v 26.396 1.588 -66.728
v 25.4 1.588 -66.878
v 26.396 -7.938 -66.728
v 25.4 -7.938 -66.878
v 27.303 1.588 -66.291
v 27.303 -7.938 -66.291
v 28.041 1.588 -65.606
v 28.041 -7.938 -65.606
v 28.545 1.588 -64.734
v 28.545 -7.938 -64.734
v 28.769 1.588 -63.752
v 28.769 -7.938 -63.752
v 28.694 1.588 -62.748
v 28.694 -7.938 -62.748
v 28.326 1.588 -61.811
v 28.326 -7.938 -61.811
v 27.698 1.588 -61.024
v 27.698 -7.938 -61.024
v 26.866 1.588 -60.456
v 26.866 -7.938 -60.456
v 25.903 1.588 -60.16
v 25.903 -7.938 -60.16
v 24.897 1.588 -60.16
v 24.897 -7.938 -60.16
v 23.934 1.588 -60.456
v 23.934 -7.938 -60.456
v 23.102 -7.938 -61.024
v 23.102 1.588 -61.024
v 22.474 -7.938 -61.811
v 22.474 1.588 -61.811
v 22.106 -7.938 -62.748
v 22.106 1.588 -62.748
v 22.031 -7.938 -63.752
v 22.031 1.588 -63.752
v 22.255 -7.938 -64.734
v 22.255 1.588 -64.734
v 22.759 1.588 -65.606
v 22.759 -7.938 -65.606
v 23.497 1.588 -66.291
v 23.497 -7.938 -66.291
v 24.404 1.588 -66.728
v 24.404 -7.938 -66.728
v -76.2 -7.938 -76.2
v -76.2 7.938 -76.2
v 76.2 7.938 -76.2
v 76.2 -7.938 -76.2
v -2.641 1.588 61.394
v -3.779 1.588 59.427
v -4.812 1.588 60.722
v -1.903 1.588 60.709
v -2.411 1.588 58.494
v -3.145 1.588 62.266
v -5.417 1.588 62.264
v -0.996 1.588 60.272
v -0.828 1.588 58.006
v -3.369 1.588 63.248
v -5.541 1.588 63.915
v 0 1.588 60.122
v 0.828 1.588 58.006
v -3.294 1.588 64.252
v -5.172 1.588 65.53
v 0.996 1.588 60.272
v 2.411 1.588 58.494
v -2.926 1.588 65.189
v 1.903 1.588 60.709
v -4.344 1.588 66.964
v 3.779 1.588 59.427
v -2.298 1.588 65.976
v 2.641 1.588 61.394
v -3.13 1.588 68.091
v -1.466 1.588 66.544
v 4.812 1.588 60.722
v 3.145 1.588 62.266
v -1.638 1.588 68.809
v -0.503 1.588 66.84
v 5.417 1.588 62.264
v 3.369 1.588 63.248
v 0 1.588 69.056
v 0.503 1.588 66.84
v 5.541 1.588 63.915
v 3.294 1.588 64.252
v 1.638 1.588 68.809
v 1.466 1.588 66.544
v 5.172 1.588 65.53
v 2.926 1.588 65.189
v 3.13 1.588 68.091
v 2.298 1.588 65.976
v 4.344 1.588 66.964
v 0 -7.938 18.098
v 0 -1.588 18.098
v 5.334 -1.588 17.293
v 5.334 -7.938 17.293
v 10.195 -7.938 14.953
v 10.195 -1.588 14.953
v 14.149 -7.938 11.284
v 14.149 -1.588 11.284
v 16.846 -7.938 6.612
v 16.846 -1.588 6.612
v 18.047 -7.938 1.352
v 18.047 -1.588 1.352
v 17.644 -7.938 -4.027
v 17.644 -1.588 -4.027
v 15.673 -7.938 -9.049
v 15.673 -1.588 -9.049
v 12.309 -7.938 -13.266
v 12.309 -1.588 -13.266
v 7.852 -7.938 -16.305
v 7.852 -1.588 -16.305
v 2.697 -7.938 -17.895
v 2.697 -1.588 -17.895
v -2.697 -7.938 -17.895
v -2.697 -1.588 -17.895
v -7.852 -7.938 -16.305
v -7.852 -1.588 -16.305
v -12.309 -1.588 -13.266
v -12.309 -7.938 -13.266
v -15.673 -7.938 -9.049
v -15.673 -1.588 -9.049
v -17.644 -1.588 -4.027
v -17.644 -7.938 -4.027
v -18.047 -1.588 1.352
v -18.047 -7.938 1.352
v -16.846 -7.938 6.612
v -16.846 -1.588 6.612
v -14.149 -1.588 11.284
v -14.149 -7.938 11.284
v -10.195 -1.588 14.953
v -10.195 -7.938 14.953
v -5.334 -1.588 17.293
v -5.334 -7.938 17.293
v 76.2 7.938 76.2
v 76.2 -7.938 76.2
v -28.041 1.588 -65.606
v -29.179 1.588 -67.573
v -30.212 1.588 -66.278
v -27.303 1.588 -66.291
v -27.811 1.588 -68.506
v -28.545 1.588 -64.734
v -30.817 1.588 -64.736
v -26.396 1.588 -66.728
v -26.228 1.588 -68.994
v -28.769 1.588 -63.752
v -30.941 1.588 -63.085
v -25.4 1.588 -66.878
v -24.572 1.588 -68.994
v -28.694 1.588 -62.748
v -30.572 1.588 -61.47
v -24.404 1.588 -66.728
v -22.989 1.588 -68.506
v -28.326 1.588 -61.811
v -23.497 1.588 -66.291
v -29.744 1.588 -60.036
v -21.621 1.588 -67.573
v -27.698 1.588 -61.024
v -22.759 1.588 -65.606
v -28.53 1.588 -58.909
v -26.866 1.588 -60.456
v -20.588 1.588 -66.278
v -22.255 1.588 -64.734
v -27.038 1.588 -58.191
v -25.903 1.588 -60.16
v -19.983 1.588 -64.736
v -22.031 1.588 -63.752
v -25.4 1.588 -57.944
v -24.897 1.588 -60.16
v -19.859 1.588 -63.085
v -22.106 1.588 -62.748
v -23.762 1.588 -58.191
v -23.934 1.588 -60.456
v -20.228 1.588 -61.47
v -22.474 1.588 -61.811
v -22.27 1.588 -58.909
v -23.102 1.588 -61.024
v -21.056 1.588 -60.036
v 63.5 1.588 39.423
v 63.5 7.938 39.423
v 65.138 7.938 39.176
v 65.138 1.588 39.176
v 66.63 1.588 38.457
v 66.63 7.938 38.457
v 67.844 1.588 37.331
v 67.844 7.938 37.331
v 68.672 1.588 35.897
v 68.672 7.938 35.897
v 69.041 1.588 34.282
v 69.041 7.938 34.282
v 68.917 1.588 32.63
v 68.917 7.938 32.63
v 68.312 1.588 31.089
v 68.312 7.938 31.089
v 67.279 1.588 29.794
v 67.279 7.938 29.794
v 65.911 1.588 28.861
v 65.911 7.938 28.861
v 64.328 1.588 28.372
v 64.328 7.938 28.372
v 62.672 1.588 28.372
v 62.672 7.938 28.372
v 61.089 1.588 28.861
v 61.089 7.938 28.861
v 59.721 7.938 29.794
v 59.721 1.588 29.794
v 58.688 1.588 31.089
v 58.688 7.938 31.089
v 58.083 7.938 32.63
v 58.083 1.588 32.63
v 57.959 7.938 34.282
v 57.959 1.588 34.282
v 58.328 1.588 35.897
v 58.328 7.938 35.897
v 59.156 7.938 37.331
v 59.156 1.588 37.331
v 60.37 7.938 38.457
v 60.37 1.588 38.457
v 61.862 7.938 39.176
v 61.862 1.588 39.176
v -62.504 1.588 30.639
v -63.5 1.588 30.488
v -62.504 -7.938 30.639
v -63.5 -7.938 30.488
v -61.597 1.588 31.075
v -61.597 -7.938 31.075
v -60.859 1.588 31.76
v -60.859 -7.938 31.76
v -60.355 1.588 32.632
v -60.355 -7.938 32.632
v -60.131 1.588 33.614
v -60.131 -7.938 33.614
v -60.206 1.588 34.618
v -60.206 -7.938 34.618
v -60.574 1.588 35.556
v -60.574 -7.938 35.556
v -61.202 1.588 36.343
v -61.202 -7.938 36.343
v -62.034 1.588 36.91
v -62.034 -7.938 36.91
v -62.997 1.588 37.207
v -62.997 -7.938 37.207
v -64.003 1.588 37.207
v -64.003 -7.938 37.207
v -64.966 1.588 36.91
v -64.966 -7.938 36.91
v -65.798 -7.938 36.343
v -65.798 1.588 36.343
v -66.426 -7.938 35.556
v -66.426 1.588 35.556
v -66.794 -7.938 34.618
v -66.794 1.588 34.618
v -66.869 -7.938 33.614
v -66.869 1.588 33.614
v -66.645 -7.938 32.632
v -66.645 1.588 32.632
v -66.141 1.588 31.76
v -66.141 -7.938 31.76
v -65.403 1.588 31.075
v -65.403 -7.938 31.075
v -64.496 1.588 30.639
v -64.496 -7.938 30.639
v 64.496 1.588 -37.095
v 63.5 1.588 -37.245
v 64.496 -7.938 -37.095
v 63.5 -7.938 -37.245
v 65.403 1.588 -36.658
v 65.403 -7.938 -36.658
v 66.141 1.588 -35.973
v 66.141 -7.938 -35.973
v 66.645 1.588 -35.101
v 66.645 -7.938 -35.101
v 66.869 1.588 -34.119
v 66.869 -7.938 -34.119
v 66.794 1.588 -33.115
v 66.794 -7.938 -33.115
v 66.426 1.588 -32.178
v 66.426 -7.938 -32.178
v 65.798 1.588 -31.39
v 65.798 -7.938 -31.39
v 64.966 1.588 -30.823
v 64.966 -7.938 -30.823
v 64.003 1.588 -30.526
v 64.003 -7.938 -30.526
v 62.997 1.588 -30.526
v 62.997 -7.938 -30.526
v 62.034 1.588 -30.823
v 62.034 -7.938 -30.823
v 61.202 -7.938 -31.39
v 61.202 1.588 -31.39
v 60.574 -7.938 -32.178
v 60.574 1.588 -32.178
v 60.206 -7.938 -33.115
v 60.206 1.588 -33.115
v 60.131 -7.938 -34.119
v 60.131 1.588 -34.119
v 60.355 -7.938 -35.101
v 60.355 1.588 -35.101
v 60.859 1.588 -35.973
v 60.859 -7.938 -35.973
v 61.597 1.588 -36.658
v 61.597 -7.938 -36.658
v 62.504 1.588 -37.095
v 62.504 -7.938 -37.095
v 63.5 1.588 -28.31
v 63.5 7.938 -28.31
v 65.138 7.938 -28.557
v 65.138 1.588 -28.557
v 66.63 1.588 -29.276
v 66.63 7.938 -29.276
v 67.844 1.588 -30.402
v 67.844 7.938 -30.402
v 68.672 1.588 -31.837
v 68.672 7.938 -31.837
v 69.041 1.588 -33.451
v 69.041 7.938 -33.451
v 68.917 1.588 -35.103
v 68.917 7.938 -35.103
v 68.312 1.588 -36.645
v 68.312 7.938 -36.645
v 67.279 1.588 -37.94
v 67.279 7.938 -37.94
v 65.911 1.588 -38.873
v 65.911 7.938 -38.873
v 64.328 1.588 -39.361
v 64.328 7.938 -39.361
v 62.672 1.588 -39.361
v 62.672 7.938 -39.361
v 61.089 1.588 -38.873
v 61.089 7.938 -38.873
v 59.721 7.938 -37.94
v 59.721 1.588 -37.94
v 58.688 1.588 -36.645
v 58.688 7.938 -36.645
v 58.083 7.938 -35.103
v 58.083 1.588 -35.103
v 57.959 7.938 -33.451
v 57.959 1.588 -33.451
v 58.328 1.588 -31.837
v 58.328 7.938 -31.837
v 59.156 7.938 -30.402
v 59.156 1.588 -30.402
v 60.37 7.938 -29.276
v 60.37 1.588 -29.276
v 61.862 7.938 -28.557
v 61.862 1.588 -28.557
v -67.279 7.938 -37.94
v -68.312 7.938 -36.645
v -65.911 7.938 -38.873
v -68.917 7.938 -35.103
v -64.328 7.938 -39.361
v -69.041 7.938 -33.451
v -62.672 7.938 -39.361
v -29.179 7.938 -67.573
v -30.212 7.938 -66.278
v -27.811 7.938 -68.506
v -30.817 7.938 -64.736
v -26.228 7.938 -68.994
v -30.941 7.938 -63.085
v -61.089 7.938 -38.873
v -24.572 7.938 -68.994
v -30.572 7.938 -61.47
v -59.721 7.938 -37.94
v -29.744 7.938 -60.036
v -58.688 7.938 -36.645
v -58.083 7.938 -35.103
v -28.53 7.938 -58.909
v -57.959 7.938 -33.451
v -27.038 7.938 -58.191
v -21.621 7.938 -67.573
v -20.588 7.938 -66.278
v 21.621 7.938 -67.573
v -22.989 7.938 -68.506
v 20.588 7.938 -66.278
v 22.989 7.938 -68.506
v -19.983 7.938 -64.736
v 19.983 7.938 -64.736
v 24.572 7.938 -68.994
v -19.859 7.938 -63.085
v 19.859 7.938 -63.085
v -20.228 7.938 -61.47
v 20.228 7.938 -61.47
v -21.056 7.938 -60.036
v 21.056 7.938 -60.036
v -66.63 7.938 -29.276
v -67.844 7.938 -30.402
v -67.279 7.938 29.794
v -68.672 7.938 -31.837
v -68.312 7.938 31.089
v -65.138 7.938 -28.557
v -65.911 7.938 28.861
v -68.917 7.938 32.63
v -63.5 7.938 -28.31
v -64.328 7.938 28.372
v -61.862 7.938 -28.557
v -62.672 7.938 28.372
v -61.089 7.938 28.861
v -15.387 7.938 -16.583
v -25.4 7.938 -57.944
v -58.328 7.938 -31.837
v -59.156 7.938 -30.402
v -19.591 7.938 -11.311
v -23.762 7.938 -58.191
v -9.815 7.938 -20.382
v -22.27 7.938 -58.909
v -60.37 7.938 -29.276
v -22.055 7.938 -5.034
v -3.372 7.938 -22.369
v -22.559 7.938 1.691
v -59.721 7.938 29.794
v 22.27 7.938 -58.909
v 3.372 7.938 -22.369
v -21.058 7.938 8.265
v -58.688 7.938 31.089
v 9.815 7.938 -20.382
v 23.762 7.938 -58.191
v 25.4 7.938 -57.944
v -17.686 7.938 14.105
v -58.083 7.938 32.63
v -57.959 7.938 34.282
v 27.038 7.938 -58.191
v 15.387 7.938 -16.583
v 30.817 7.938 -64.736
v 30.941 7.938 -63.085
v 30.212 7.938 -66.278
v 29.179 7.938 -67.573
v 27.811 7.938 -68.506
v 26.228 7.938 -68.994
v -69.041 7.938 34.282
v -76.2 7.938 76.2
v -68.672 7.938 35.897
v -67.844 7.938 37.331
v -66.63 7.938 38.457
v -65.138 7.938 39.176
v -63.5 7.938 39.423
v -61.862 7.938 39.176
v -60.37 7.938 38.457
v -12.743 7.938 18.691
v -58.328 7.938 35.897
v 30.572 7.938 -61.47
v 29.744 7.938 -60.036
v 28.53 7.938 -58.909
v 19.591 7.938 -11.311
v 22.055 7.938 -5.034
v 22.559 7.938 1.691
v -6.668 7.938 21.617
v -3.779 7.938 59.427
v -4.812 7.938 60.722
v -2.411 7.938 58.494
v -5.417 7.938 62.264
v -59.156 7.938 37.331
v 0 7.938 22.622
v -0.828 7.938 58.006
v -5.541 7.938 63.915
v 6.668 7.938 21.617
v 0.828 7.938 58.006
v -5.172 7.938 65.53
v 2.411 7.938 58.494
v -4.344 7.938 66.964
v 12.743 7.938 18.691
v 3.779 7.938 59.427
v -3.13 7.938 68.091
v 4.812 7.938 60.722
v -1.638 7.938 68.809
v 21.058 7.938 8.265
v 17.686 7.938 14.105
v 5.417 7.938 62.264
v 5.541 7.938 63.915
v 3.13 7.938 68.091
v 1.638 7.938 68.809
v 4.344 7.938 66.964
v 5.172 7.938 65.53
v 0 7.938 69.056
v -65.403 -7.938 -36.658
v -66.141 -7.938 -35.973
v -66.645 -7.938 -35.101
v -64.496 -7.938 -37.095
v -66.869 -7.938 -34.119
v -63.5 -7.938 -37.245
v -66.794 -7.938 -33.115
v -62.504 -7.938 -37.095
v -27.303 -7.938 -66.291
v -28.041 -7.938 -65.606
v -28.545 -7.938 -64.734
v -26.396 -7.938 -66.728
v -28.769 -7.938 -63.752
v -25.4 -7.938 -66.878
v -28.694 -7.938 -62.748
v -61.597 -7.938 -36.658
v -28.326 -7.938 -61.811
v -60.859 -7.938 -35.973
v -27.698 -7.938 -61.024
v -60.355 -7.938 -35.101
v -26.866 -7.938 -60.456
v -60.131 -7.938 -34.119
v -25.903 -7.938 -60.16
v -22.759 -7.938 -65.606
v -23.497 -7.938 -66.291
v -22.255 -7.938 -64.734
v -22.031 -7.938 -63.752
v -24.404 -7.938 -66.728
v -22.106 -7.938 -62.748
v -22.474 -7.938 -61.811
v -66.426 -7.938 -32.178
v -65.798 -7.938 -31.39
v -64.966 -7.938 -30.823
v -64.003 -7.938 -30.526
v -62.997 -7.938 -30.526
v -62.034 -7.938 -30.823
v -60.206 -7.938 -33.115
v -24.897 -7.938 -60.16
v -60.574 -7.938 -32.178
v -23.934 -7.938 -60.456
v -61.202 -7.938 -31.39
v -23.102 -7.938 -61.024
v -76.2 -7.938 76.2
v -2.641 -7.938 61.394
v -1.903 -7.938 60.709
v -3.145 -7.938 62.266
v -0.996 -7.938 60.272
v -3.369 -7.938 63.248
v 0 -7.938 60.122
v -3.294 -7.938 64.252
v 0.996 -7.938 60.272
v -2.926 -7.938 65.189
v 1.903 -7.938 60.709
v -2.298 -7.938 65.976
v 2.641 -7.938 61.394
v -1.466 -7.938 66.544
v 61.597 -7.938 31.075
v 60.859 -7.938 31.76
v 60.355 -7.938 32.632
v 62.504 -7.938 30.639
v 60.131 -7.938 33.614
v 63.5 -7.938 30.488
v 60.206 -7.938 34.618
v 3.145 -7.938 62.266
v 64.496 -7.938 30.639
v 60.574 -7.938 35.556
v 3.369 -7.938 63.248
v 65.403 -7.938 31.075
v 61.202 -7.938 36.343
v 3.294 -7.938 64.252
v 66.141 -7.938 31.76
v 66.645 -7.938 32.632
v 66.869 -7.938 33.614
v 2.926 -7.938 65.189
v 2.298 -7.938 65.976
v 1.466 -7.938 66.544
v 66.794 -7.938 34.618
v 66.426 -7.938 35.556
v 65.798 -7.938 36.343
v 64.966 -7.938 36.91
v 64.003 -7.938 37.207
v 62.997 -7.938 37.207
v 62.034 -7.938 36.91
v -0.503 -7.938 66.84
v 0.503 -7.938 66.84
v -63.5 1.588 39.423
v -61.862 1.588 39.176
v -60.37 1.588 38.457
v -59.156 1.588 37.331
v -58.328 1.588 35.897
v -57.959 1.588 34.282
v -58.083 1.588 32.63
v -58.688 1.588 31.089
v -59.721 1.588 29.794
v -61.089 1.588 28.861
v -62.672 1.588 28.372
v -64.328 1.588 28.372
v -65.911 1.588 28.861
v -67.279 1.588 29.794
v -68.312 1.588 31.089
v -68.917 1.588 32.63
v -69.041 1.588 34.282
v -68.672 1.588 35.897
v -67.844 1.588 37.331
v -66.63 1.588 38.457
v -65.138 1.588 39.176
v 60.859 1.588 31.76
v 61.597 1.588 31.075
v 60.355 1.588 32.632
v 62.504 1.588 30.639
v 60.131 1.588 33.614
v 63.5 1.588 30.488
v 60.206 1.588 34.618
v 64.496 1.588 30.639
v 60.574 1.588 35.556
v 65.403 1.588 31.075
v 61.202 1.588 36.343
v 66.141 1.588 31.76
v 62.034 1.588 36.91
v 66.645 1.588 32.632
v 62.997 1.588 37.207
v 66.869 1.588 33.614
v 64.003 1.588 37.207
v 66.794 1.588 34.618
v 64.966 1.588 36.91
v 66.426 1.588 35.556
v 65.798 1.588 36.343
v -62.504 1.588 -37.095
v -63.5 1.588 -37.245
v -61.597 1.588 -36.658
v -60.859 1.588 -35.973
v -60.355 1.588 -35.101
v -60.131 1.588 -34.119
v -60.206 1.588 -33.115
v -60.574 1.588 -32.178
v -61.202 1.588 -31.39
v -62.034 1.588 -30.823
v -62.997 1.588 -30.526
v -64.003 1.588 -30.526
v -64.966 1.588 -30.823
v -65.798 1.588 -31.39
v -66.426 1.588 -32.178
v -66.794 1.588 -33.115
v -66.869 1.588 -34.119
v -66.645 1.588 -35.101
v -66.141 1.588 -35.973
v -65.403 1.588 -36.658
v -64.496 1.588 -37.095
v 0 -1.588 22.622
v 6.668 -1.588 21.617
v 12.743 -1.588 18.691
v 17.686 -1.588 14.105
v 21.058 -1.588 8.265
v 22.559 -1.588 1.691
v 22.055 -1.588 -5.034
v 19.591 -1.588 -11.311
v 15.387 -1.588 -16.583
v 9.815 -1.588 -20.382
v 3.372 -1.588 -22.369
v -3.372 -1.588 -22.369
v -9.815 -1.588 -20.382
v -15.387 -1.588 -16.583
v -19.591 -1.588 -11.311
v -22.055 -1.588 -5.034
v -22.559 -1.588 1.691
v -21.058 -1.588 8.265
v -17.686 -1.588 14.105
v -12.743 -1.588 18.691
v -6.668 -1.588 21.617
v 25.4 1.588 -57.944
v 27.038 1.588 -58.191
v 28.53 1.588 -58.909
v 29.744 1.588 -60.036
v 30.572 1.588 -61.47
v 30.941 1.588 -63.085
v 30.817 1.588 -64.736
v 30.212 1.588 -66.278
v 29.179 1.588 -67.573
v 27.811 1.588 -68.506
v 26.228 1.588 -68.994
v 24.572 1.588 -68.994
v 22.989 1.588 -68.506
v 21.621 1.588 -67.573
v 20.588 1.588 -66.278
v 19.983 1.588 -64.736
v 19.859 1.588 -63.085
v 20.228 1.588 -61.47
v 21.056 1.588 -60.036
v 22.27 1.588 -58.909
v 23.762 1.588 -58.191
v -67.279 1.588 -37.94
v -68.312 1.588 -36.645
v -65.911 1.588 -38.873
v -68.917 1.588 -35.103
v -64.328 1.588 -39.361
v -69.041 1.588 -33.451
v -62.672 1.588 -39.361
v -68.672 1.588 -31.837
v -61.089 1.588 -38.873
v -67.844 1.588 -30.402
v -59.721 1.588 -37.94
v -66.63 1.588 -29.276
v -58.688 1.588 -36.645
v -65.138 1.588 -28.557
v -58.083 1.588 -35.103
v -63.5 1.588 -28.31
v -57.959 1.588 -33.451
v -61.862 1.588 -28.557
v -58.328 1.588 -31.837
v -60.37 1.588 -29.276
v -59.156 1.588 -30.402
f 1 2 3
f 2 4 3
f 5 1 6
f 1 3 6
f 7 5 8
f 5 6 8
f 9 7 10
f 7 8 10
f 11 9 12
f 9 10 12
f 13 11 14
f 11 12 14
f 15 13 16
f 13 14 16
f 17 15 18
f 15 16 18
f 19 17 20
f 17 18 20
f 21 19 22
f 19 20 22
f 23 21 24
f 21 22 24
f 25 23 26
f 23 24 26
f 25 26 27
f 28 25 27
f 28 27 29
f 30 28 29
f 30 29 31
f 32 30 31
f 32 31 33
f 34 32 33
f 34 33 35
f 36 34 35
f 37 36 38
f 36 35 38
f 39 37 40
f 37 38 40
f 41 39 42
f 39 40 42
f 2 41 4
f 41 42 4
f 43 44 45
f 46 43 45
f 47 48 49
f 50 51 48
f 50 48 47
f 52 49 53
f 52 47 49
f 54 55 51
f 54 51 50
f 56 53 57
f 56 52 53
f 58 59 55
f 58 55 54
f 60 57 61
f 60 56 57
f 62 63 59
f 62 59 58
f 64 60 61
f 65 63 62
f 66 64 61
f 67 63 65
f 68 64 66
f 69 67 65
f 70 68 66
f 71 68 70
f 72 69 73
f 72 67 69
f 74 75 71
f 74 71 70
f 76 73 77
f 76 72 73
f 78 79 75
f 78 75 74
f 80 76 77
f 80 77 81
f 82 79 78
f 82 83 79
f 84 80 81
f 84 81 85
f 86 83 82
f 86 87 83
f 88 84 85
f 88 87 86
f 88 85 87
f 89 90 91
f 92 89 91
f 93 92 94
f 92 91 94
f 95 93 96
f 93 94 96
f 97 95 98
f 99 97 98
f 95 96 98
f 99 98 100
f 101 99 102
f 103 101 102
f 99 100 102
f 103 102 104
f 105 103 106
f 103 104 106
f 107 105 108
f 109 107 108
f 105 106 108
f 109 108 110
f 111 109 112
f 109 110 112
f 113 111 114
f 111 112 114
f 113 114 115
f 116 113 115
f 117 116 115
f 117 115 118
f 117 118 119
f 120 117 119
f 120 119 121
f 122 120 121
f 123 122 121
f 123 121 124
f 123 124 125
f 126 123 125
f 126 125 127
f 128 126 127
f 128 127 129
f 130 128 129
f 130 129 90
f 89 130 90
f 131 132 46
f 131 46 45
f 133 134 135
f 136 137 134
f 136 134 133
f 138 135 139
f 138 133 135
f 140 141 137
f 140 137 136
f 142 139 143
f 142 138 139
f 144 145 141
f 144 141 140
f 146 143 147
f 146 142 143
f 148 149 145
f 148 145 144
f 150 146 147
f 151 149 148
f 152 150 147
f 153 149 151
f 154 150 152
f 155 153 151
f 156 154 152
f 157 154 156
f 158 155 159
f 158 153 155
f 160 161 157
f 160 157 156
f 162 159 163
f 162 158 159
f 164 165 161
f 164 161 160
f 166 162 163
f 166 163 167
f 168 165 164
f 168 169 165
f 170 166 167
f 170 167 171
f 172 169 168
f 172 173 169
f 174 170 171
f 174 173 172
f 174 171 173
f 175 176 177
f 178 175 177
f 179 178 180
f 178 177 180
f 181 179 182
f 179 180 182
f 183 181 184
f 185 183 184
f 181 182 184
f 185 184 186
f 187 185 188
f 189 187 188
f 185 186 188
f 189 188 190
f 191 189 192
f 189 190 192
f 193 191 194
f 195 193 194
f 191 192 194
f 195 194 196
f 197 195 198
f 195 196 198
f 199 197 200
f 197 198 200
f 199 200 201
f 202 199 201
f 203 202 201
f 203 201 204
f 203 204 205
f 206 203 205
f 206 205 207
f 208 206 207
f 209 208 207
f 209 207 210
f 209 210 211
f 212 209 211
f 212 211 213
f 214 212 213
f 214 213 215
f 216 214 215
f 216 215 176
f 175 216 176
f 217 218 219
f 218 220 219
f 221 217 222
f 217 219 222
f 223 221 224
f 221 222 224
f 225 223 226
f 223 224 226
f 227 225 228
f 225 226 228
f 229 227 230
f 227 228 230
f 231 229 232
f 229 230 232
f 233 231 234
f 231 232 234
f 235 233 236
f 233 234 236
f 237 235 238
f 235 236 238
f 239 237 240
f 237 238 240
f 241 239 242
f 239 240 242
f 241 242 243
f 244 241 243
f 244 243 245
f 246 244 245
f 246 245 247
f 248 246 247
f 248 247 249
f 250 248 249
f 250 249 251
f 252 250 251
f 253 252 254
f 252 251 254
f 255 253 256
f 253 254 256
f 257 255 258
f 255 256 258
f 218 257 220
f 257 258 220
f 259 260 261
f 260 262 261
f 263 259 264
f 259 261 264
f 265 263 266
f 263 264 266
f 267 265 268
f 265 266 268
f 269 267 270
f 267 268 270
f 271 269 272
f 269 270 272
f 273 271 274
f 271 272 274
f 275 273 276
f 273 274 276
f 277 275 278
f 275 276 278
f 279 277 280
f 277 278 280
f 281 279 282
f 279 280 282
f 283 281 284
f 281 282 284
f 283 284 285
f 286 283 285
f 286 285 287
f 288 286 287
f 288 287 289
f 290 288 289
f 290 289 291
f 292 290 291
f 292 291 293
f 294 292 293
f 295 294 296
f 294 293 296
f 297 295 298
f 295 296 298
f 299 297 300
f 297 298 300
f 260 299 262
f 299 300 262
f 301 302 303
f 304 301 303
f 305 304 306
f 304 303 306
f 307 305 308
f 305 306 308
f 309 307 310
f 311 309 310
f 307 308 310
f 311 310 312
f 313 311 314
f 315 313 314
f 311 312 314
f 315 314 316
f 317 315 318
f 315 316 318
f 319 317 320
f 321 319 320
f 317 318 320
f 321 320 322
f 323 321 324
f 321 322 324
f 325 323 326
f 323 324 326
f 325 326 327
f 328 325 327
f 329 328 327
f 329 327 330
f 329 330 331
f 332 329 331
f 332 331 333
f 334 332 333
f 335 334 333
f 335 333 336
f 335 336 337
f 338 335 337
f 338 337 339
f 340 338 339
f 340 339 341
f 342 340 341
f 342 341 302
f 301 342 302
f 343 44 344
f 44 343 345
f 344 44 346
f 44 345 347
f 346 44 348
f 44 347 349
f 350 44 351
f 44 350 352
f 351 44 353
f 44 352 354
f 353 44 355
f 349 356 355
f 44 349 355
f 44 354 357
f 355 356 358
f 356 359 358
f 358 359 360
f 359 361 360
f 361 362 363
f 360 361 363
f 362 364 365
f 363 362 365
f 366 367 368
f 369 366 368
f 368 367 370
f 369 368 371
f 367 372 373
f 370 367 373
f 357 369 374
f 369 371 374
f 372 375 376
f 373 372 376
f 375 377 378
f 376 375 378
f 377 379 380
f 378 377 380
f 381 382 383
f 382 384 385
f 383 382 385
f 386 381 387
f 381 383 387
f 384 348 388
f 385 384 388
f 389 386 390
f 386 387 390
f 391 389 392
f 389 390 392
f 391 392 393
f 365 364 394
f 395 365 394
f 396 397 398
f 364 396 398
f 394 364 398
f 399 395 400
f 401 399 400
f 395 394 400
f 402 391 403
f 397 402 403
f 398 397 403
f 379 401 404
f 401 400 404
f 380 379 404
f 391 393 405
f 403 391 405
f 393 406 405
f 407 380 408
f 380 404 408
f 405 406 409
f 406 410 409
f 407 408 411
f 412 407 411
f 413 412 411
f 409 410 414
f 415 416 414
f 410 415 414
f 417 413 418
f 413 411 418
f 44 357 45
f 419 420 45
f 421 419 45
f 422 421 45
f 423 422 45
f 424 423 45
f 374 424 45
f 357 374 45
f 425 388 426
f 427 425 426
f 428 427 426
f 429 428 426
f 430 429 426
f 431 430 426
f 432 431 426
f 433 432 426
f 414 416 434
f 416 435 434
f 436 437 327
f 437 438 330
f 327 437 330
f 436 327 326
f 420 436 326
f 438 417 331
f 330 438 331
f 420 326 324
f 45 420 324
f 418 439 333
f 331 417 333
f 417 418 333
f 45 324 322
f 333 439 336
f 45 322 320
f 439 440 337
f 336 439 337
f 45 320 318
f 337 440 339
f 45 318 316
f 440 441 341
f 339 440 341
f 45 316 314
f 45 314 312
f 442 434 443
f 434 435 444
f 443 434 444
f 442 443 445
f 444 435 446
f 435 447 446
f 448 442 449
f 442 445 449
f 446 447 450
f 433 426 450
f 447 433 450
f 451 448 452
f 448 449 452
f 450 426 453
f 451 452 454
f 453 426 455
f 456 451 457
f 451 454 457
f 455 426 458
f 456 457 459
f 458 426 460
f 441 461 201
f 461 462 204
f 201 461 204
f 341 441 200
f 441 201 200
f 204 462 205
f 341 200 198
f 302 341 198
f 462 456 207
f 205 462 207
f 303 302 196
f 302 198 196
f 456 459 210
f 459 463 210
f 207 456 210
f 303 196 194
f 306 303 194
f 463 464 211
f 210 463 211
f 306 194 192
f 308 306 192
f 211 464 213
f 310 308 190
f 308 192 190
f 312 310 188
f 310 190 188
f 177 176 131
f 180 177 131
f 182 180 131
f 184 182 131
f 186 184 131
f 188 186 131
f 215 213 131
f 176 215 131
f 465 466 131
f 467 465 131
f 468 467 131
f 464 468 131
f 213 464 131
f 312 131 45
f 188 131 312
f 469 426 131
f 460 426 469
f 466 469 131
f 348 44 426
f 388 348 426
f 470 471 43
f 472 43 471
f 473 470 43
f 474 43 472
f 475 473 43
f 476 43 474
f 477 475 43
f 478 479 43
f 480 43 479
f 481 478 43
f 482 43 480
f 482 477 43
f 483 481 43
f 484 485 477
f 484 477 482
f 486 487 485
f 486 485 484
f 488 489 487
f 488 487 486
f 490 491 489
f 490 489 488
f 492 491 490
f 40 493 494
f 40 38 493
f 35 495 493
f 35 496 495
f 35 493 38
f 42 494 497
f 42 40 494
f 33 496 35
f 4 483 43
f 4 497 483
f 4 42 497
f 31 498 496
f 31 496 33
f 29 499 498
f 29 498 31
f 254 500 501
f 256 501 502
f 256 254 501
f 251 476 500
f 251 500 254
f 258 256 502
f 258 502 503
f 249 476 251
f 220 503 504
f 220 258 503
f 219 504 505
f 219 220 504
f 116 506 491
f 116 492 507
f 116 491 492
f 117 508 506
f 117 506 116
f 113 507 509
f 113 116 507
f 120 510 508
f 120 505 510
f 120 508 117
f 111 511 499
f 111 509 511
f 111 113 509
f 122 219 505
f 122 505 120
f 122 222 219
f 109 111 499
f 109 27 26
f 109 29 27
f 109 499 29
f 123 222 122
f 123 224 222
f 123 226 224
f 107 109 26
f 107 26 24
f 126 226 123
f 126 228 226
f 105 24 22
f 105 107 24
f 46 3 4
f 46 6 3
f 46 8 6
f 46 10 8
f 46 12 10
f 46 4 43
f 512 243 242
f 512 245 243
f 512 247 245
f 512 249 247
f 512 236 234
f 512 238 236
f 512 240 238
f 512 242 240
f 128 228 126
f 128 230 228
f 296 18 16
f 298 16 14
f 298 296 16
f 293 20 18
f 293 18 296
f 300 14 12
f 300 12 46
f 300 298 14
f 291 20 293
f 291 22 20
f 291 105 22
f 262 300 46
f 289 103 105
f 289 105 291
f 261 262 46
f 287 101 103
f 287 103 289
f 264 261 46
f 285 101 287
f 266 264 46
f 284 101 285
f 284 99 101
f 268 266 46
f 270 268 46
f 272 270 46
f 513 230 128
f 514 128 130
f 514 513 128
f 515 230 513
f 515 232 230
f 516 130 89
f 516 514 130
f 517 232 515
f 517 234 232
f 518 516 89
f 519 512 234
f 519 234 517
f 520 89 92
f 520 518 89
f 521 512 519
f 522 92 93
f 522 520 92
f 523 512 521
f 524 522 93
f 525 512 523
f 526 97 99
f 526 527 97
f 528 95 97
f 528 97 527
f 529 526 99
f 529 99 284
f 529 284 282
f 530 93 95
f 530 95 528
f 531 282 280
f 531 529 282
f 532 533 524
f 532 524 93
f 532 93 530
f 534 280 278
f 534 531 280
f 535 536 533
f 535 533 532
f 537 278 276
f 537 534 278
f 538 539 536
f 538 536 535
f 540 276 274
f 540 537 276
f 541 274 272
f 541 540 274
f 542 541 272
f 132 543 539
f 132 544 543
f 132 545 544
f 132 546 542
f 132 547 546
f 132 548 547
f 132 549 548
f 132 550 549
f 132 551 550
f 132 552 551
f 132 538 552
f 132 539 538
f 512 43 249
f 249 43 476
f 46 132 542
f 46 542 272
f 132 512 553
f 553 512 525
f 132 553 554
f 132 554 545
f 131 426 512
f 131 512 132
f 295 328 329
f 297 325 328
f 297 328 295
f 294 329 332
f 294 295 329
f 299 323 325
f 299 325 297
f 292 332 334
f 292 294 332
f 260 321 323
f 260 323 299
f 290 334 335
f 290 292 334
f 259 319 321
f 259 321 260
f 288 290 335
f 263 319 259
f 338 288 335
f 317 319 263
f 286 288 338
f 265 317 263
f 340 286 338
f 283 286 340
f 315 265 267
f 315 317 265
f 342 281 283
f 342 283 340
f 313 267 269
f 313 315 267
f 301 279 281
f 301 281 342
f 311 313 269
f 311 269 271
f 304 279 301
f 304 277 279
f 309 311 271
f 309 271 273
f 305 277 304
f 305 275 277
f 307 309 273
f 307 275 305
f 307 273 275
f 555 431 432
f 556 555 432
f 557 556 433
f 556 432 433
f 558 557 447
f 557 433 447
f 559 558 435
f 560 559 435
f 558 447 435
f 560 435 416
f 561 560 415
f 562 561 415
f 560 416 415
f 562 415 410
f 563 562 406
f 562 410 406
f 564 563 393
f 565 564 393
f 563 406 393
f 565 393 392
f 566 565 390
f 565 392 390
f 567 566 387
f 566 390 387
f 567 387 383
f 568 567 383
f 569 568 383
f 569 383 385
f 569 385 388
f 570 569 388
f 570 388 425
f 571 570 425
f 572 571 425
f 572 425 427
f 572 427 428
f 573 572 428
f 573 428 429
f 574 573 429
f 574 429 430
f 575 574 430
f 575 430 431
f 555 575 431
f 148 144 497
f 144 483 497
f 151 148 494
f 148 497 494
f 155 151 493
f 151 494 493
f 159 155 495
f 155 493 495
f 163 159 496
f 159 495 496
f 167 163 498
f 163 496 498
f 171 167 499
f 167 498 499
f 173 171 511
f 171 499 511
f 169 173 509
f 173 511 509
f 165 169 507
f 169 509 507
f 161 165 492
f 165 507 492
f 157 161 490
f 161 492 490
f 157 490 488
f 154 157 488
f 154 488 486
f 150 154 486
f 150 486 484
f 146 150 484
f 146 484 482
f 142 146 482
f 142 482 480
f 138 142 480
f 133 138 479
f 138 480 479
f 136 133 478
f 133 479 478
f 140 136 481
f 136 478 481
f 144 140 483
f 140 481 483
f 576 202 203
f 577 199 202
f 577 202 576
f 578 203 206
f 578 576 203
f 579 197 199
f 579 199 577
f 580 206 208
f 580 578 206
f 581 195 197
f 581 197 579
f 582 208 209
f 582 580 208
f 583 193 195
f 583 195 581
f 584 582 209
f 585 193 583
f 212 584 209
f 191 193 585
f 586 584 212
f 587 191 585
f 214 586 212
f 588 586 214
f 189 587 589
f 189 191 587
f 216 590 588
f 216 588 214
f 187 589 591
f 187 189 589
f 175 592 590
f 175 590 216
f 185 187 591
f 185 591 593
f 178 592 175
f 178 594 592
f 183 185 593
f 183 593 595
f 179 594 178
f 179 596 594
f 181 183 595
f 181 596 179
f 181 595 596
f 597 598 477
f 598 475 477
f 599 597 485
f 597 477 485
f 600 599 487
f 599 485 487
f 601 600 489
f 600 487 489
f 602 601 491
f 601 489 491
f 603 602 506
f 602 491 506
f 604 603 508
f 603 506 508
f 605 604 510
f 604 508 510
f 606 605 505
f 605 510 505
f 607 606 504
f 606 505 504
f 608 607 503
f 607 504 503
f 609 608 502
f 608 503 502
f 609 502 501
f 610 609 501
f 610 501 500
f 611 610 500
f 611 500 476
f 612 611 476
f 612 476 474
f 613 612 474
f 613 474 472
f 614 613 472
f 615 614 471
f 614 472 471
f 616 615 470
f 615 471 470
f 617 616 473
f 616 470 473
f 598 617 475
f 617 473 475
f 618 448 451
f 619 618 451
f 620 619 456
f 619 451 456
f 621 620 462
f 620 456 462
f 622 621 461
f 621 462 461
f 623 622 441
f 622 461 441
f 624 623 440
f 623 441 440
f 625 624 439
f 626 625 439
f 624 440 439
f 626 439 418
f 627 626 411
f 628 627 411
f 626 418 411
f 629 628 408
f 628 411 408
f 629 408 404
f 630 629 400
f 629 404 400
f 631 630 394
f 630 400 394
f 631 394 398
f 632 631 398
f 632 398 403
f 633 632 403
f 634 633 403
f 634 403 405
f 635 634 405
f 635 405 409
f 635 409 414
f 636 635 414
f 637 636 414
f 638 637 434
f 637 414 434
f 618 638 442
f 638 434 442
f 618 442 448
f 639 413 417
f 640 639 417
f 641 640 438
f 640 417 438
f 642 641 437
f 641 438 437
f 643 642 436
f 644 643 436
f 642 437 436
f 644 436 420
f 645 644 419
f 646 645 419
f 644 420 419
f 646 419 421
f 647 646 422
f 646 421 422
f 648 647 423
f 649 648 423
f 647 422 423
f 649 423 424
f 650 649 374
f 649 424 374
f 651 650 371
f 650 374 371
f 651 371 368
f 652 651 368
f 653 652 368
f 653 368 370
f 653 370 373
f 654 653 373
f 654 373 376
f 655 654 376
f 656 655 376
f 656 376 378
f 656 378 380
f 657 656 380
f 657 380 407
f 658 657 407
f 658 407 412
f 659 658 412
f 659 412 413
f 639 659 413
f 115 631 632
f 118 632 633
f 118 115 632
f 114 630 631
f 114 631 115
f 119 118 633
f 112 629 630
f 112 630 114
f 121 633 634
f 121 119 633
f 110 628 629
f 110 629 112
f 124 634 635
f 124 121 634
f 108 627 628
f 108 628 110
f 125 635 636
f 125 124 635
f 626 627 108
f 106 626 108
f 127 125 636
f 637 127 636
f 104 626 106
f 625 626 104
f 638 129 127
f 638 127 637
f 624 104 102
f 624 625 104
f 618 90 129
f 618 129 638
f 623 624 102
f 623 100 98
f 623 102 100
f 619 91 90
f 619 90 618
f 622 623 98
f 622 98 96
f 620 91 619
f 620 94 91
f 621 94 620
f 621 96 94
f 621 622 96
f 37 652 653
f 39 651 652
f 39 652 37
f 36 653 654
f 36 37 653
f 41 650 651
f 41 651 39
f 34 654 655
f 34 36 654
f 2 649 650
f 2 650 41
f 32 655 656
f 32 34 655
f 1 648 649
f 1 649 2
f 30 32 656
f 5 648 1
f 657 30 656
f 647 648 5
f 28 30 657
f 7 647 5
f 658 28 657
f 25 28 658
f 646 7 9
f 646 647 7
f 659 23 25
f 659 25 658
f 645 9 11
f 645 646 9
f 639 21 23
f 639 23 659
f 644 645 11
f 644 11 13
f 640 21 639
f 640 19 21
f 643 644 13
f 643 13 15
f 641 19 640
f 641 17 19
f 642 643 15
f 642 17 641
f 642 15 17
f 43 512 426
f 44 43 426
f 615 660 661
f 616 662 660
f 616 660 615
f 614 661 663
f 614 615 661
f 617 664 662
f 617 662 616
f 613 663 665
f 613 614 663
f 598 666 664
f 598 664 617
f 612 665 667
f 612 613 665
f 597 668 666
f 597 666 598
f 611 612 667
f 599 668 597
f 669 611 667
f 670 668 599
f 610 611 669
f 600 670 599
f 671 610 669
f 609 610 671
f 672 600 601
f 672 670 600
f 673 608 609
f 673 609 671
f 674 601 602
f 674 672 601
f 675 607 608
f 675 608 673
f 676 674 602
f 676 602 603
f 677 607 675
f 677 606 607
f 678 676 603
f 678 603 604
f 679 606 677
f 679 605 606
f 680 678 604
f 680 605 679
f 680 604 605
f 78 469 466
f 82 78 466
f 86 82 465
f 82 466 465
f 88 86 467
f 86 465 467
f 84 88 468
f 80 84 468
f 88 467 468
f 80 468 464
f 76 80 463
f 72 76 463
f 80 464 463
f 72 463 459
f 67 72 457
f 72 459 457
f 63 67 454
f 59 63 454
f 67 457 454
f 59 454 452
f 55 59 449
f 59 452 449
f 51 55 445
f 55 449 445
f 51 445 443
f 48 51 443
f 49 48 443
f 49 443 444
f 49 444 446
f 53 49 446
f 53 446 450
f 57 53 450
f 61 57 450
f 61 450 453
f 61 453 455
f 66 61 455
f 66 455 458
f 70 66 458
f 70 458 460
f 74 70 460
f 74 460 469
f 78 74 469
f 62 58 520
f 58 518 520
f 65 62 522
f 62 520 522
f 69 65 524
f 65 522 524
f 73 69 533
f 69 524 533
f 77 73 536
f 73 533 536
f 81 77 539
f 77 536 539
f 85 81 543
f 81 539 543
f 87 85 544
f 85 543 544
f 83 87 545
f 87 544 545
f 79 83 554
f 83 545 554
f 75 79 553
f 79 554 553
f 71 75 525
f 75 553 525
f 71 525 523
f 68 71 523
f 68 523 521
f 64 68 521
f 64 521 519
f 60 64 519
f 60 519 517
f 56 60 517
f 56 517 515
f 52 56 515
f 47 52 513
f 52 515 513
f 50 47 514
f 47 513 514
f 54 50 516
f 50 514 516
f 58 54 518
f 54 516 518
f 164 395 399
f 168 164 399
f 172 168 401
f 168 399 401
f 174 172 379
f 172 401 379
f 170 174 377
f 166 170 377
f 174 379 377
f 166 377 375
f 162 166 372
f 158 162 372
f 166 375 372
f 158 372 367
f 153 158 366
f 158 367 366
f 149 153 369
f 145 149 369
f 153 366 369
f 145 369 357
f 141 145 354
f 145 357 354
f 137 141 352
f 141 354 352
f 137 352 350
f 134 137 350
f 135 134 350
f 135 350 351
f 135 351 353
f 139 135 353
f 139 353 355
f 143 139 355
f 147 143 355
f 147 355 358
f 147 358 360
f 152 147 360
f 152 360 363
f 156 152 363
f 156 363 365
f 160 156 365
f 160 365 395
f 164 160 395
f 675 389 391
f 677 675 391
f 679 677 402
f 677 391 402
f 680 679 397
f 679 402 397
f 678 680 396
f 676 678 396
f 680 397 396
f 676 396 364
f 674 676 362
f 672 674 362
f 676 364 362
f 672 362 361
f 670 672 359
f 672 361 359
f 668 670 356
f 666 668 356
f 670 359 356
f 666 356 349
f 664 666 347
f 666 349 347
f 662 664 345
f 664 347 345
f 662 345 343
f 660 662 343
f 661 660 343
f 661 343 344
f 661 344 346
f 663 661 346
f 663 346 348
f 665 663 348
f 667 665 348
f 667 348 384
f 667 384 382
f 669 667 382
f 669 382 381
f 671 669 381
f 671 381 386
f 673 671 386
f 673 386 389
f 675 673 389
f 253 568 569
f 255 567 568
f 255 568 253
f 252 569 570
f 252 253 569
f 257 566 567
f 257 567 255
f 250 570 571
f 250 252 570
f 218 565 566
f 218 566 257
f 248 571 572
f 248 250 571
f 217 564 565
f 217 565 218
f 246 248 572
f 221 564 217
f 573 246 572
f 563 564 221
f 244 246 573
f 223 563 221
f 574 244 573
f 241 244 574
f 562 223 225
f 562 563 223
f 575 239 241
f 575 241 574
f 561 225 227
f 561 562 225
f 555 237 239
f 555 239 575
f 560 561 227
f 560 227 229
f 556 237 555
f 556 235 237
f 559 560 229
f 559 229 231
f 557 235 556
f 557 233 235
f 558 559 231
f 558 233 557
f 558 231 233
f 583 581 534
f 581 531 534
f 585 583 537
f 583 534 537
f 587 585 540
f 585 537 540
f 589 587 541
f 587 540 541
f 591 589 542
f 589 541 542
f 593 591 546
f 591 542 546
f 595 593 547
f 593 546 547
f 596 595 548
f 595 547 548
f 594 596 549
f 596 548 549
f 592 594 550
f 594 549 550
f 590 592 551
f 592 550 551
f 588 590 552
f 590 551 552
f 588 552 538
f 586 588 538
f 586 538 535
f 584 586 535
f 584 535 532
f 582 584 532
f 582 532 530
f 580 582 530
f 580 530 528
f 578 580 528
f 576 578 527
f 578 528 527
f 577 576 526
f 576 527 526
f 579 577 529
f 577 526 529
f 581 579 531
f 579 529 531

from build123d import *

# Parameters (mm, degrees)
SKETCH3_W                                        = 152.4
SKETCH3_H                                        = 15.875
BOSS_EXTRUDE1_DEPTH                              = 76.2
SKETCH4_R                                        = 22.621875
CUT_EXTRUDE1_DEPTH                               = 9.525
SKETCH5_R                                        = 18.0975
CUT_EXTRUDE2_DEPTH                               = 109.183203987
CBORE_FOR_1_4_SOCKET_HEAD_CAP_SCREW1_D           = 6.7564
CBORE_FOR_1_4_SOCKET_HEAD_CAP_SCREW1_CBORE_D     = 11.1125
CBORE_FOR_1_4_SOCKET_HEAD_CAP_SCREW1_CBORE_DEPTH = 6.35


with BuildPart() as part:
    # Sketch3 → Boss-Extrude1 (new, symmetric)
    with BuildSketch(Plane.XY):
        Rectangle(SKETCH3_W, SKETCH3_H)
    extrude(amount=BOSS_EXTRUDE1_DEPTH, both=True)

    # Sketch4 → Cut-Extrude1 (cut)
    with BuildSketch(Plane(origin=(0, 7.9375, 0), x_dir=(1, 0, 0), z_dir=(0, 1, 0))):
        with Locations(Location((0, 0, 0), (0, 0, 270))):
            Circle(SKETCH4_R)
    extrude(amount=-CUT_EXTRUDE1_DEPTH, mode=Mode.SUBTRACT)

    # Sketch5 → Cut-Extrude2 (cut, through all)
    with BuildSketch(Plane(origin=(0, -1.5875, 0), x_dir=(1, 0, 0), z_dir=(0, 1, 0))):
        with Locations(Location((0, 0, 0), (0, 0, 270))):
            Circle(SKETCH5_R)
    extrude(amount=-CUT_EXTRUDE2_DEPTH, mode=Mode.SUBTRACT)

    # CBORE for 1/4 Socket Head Cap Screw1 (through all)
    with Locations(Plane(origin=(-63.5, 7.9375, -33.866666667), x_dir=(0, 0, 1), z_dir=(0, 1, 0))):
        with Locations((0, 0), (-29.633333333, 38.1), (-29.633333333, 88.9), (0, 127), (67.733333334, 127), (97.366666667, 63.5), (67.733333334, 0)):
            CounterBoreHole(CBORE_FOR_1_4_SOCKET_HEAD_CAP_SCREW1_D / 2, CBORE_FOR_1_4_SOCKET_HEAD_CAP_SCREW1_CBORE_D / 2, CBORE_FOR_1_4_SOCKET_HEAD_CAP_SCREW1_CBORE_DEPTH)


solid = part.part
